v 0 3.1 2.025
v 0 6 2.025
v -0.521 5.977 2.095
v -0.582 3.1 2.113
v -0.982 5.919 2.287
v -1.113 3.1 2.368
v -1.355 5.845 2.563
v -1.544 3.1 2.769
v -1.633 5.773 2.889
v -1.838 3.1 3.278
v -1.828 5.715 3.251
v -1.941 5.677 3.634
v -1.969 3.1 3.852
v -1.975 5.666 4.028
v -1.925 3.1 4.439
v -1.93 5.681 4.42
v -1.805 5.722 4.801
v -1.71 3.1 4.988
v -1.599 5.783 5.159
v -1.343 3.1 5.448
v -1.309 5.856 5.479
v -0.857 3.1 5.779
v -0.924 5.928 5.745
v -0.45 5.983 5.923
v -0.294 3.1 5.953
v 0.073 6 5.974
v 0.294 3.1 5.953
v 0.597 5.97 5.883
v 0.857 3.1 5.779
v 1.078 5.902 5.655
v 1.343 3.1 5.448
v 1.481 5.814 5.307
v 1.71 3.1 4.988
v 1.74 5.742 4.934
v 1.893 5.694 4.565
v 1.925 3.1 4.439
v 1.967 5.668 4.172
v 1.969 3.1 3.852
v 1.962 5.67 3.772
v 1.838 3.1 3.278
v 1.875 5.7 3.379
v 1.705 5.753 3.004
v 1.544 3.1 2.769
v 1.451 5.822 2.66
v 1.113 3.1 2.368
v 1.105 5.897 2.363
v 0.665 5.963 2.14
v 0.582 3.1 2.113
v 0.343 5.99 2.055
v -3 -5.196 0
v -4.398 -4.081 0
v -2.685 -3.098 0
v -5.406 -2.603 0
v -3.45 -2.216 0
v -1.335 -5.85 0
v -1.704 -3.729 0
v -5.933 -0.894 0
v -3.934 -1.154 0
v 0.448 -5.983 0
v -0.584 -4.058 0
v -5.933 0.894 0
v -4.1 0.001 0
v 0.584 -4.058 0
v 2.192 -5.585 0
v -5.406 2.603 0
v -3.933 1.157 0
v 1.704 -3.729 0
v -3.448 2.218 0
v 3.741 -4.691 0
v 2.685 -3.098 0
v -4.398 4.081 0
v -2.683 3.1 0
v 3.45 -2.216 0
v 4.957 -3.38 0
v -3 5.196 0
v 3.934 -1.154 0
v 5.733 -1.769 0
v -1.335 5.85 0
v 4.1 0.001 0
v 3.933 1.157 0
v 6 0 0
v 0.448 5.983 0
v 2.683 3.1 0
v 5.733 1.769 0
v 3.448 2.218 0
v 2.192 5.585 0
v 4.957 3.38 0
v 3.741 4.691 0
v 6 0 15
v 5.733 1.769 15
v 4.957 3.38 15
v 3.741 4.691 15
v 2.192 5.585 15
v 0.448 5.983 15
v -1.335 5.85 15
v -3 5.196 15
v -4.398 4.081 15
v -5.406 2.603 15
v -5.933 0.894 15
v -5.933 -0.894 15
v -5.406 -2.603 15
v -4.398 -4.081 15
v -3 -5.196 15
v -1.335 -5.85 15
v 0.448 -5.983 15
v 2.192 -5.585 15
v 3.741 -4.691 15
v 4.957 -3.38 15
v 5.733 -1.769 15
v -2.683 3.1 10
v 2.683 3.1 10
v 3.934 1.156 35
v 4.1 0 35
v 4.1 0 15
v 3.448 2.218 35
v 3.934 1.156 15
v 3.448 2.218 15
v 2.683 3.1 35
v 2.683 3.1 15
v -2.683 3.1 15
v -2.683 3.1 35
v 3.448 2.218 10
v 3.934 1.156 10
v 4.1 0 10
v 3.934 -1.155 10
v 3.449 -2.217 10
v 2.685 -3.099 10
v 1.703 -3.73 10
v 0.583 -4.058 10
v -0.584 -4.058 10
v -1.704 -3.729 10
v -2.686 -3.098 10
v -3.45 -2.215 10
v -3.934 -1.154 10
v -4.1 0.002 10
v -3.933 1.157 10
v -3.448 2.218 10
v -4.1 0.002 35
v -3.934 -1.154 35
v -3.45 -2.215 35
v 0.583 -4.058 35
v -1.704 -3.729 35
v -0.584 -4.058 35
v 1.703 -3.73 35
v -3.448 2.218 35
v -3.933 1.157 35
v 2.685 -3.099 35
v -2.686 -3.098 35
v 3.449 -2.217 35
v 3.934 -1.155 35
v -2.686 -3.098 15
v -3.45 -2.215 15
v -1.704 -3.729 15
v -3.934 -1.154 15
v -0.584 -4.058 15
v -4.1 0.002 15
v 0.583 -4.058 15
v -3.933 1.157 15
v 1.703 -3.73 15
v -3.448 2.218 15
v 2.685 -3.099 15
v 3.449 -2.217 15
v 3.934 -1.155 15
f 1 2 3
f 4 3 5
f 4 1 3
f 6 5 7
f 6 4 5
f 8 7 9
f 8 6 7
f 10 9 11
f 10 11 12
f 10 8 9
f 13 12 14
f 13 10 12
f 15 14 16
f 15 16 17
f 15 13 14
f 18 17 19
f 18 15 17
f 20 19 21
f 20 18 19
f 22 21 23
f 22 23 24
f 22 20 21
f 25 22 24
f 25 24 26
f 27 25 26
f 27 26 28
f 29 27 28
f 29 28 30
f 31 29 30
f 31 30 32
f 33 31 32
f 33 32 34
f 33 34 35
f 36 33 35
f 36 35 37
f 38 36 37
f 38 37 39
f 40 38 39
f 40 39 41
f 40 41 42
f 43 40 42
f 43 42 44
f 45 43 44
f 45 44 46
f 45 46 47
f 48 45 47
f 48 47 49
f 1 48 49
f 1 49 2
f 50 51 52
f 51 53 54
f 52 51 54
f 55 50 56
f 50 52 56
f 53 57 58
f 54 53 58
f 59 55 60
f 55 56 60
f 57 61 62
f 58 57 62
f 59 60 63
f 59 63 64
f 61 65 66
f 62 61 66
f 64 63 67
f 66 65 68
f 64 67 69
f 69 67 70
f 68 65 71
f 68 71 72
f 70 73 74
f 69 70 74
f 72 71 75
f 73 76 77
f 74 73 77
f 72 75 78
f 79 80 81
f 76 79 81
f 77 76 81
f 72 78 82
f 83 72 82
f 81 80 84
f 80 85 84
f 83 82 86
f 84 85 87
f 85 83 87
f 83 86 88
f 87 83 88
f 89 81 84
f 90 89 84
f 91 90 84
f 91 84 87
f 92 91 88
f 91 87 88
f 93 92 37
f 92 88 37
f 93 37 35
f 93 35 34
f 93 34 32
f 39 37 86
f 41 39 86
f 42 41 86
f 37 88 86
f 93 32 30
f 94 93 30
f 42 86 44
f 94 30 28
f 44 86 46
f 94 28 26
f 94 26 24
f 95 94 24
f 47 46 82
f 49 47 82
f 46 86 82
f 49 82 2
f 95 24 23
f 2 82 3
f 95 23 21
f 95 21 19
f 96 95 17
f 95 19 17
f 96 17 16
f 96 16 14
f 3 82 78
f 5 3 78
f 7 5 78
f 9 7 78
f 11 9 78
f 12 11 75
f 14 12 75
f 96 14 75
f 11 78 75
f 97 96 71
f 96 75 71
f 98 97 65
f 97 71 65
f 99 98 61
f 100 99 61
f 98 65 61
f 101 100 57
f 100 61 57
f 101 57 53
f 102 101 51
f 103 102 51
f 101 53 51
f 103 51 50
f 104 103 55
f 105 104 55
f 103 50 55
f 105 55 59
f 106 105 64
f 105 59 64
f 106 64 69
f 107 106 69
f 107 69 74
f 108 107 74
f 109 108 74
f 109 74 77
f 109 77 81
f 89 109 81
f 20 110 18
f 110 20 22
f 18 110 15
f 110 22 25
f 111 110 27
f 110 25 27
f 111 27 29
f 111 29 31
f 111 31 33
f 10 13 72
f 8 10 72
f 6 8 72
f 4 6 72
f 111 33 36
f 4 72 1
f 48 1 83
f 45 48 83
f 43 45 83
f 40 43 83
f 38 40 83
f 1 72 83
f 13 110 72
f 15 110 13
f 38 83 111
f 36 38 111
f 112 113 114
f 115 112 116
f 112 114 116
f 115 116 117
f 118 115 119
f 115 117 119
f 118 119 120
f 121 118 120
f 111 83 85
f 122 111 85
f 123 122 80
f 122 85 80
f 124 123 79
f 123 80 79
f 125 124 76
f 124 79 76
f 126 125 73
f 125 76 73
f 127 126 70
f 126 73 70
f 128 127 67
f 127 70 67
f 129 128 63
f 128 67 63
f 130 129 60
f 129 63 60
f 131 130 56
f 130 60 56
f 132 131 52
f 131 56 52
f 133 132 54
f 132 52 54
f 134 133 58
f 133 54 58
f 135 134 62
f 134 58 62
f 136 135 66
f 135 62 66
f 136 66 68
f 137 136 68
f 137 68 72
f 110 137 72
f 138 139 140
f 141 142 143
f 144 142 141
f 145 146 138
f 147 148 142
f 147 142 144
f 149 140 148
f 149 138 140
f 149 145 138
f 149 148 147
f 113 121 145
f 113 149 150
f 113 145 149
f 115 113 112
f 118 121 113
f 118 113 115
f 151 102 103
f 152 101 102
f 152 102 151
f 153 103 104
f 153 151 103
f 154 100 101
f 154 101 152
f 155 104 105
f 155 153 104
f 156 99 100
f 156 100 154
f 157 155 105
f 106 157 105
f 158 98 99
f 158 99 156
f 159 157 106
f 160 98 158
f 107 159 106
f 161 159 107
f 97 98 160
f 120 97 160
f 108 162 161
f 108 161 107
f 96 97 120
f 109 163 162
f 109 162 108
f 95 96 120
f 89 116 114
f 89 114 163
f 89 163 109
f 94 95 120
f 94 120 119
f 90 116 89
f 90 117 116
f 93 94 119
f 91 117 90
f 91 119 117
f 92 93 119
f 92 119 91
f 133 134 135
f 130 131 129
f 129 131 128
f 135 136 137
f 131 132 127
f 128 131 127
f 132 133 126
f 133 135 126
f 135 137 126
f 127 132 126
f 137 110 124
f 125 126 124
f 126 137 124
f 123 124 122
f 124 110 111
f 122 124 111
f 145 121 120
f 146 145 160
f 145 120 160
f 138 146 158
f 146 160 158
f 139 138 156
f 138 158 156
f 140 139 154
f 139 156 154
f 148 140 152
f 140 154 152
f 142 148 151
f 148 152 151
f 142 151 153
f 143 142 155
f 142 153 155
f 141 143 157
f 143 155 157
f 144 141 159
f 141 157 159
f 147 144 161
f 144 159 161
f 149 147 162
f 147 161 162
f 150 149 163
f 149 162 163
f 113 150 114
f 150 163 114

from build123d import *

# Parameters (mm, degrees)
SKETCH1_R                = 6
BOSS_EXTRUDE1_DEPTH      = 15
BOSS_EXTRUDE2_DEPTH      = 20
BOSS_EXTRUDE2_DEPTH_BACK = 5
BOSS_EXTRUDE2_START      = 15
CUT_EXTRUDE1_REACH       = 38.014
CUT_EXTRUDE1_END_RADIUS  = 6
SKETCH3_R                = 1.975


with BuildPart() as part:
    # Sketch1 → Boss-Extrude1 (new body)
    with BuildSketch(Plane.XY):
        Circle(SKETCH1_R)
        with BuildLine():
            Line((-2.683281573, 3.1), (2.683281573, 3.1))
            ThreePointArc((2.683281573, 3.1), (0, -4.1), (-2.683281573, 3.1))
        make_face(mode=Mode.SUBTRACT)
    extrude(amount=BOSS_EXTRUDE1_DEPTH)

    # Sketch1<3> → Boss-Extrude2 (add, two sides: drawn at the far end of the back side and taken through both)
    with BuildSketch(Plane.XY.offset(BOSS_EXTRUDE2_START - BOSS_EXTRUDE2_DEPTH_BACK)):
        with BuildLine():
            Line((2.683281573, 3.1), (-2.683281573, 3.1))
            ThreePointArc((-2.683281573, 3.1), (-1.704192705, -3.729038378), (4.1, 0))
            ThreePointArc((4.1, 0), (3.729038378, 1.704192705), (2.683281573, 3.1))
        make_face()
    extrude(amount=BOSS_EXTRUDE2_DEPTH + BOSS_EXTRUDE2_DEPTH_BACK)

    # Cut-Extrude1: up to this cylinder (the profile starts inside it)
    cut_extrude1_end = Plane(origin=(0, 0, 4), z_dir=(0, 0, -1)) * Cylinder(CUT_EXTRUDE1_END_RADIUS, 89.028, mode=Mode.PRIVATE)
    # Sketch3 → Cut-Extrude1 (cut, up to the surface)
    with BuildSketch(Plane(origin=(0, 0, 0), x_dir=(1, 0, 0), z_dir=(0, 1, 0)), mode=Mode.PRIVATE) as cut_extrude1_sk1:
        with Locations(Location((0, -4, 0), (0, 0, 90))):
            Circle(SKETCH3_R)
    cut_extrude1_tool1 = extrude(cut_extrude1_sk1.sketch, amount=CUT_EXTRUDE1_REACH, mode=Mode.PRIVATE) & cut_extrude1_end
    add(cut_extrude1_tool1.solids().sort_by_distance((0, 0, 4))[0], mode=Mode.SUBTRACT)


solid = part.part
